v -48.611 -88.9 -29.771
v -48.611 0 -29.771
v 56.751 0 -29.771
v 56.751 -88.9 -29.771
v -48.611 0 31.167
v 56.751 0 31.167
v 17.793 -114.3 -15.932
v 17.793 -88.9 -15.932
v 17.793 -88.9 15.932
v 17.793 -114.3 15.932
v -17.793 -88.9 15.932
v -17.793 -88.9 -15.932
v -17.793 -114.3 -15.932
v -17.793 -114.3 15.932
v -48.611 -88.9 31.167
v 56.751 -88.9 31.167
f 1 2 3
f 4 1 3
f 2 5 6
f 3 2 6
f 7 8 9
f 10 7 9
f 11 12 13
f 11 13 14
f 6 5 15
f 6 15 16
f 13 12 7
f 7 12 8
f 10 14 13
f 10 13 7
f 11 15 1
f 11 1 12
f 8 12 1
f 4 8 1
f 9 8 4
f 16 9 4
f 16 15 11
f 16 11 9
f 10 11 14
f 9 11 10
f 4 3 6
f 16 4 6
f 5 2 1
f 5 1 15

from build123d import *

# Parameters (mm, degrees)
F0_W     = 105.362009
F0_H     = 60.93785
F1_DEPTH = 88.9
F2_W     = 35.585844
F2_H     = 31.86445
F3_DEPTH = 25.4


with BuildPart() as f1:
    # F0 (on Front) → F1 (new body)
    with BuildSketch(Plane.XZ):
        with Locations((4.070277, 0.697763)):
            Rectangle(F0_W, F0_H)
    extrude(amount=F1_DEPTH)

    # F2 (on face) → F3 (join)
    with BuildSketch(Plane.XZ.offset(88.9)):
        Rectangle(F2_W, F2_H)
    extrude(amount=F3_DEPTH)


solid = f1.part
